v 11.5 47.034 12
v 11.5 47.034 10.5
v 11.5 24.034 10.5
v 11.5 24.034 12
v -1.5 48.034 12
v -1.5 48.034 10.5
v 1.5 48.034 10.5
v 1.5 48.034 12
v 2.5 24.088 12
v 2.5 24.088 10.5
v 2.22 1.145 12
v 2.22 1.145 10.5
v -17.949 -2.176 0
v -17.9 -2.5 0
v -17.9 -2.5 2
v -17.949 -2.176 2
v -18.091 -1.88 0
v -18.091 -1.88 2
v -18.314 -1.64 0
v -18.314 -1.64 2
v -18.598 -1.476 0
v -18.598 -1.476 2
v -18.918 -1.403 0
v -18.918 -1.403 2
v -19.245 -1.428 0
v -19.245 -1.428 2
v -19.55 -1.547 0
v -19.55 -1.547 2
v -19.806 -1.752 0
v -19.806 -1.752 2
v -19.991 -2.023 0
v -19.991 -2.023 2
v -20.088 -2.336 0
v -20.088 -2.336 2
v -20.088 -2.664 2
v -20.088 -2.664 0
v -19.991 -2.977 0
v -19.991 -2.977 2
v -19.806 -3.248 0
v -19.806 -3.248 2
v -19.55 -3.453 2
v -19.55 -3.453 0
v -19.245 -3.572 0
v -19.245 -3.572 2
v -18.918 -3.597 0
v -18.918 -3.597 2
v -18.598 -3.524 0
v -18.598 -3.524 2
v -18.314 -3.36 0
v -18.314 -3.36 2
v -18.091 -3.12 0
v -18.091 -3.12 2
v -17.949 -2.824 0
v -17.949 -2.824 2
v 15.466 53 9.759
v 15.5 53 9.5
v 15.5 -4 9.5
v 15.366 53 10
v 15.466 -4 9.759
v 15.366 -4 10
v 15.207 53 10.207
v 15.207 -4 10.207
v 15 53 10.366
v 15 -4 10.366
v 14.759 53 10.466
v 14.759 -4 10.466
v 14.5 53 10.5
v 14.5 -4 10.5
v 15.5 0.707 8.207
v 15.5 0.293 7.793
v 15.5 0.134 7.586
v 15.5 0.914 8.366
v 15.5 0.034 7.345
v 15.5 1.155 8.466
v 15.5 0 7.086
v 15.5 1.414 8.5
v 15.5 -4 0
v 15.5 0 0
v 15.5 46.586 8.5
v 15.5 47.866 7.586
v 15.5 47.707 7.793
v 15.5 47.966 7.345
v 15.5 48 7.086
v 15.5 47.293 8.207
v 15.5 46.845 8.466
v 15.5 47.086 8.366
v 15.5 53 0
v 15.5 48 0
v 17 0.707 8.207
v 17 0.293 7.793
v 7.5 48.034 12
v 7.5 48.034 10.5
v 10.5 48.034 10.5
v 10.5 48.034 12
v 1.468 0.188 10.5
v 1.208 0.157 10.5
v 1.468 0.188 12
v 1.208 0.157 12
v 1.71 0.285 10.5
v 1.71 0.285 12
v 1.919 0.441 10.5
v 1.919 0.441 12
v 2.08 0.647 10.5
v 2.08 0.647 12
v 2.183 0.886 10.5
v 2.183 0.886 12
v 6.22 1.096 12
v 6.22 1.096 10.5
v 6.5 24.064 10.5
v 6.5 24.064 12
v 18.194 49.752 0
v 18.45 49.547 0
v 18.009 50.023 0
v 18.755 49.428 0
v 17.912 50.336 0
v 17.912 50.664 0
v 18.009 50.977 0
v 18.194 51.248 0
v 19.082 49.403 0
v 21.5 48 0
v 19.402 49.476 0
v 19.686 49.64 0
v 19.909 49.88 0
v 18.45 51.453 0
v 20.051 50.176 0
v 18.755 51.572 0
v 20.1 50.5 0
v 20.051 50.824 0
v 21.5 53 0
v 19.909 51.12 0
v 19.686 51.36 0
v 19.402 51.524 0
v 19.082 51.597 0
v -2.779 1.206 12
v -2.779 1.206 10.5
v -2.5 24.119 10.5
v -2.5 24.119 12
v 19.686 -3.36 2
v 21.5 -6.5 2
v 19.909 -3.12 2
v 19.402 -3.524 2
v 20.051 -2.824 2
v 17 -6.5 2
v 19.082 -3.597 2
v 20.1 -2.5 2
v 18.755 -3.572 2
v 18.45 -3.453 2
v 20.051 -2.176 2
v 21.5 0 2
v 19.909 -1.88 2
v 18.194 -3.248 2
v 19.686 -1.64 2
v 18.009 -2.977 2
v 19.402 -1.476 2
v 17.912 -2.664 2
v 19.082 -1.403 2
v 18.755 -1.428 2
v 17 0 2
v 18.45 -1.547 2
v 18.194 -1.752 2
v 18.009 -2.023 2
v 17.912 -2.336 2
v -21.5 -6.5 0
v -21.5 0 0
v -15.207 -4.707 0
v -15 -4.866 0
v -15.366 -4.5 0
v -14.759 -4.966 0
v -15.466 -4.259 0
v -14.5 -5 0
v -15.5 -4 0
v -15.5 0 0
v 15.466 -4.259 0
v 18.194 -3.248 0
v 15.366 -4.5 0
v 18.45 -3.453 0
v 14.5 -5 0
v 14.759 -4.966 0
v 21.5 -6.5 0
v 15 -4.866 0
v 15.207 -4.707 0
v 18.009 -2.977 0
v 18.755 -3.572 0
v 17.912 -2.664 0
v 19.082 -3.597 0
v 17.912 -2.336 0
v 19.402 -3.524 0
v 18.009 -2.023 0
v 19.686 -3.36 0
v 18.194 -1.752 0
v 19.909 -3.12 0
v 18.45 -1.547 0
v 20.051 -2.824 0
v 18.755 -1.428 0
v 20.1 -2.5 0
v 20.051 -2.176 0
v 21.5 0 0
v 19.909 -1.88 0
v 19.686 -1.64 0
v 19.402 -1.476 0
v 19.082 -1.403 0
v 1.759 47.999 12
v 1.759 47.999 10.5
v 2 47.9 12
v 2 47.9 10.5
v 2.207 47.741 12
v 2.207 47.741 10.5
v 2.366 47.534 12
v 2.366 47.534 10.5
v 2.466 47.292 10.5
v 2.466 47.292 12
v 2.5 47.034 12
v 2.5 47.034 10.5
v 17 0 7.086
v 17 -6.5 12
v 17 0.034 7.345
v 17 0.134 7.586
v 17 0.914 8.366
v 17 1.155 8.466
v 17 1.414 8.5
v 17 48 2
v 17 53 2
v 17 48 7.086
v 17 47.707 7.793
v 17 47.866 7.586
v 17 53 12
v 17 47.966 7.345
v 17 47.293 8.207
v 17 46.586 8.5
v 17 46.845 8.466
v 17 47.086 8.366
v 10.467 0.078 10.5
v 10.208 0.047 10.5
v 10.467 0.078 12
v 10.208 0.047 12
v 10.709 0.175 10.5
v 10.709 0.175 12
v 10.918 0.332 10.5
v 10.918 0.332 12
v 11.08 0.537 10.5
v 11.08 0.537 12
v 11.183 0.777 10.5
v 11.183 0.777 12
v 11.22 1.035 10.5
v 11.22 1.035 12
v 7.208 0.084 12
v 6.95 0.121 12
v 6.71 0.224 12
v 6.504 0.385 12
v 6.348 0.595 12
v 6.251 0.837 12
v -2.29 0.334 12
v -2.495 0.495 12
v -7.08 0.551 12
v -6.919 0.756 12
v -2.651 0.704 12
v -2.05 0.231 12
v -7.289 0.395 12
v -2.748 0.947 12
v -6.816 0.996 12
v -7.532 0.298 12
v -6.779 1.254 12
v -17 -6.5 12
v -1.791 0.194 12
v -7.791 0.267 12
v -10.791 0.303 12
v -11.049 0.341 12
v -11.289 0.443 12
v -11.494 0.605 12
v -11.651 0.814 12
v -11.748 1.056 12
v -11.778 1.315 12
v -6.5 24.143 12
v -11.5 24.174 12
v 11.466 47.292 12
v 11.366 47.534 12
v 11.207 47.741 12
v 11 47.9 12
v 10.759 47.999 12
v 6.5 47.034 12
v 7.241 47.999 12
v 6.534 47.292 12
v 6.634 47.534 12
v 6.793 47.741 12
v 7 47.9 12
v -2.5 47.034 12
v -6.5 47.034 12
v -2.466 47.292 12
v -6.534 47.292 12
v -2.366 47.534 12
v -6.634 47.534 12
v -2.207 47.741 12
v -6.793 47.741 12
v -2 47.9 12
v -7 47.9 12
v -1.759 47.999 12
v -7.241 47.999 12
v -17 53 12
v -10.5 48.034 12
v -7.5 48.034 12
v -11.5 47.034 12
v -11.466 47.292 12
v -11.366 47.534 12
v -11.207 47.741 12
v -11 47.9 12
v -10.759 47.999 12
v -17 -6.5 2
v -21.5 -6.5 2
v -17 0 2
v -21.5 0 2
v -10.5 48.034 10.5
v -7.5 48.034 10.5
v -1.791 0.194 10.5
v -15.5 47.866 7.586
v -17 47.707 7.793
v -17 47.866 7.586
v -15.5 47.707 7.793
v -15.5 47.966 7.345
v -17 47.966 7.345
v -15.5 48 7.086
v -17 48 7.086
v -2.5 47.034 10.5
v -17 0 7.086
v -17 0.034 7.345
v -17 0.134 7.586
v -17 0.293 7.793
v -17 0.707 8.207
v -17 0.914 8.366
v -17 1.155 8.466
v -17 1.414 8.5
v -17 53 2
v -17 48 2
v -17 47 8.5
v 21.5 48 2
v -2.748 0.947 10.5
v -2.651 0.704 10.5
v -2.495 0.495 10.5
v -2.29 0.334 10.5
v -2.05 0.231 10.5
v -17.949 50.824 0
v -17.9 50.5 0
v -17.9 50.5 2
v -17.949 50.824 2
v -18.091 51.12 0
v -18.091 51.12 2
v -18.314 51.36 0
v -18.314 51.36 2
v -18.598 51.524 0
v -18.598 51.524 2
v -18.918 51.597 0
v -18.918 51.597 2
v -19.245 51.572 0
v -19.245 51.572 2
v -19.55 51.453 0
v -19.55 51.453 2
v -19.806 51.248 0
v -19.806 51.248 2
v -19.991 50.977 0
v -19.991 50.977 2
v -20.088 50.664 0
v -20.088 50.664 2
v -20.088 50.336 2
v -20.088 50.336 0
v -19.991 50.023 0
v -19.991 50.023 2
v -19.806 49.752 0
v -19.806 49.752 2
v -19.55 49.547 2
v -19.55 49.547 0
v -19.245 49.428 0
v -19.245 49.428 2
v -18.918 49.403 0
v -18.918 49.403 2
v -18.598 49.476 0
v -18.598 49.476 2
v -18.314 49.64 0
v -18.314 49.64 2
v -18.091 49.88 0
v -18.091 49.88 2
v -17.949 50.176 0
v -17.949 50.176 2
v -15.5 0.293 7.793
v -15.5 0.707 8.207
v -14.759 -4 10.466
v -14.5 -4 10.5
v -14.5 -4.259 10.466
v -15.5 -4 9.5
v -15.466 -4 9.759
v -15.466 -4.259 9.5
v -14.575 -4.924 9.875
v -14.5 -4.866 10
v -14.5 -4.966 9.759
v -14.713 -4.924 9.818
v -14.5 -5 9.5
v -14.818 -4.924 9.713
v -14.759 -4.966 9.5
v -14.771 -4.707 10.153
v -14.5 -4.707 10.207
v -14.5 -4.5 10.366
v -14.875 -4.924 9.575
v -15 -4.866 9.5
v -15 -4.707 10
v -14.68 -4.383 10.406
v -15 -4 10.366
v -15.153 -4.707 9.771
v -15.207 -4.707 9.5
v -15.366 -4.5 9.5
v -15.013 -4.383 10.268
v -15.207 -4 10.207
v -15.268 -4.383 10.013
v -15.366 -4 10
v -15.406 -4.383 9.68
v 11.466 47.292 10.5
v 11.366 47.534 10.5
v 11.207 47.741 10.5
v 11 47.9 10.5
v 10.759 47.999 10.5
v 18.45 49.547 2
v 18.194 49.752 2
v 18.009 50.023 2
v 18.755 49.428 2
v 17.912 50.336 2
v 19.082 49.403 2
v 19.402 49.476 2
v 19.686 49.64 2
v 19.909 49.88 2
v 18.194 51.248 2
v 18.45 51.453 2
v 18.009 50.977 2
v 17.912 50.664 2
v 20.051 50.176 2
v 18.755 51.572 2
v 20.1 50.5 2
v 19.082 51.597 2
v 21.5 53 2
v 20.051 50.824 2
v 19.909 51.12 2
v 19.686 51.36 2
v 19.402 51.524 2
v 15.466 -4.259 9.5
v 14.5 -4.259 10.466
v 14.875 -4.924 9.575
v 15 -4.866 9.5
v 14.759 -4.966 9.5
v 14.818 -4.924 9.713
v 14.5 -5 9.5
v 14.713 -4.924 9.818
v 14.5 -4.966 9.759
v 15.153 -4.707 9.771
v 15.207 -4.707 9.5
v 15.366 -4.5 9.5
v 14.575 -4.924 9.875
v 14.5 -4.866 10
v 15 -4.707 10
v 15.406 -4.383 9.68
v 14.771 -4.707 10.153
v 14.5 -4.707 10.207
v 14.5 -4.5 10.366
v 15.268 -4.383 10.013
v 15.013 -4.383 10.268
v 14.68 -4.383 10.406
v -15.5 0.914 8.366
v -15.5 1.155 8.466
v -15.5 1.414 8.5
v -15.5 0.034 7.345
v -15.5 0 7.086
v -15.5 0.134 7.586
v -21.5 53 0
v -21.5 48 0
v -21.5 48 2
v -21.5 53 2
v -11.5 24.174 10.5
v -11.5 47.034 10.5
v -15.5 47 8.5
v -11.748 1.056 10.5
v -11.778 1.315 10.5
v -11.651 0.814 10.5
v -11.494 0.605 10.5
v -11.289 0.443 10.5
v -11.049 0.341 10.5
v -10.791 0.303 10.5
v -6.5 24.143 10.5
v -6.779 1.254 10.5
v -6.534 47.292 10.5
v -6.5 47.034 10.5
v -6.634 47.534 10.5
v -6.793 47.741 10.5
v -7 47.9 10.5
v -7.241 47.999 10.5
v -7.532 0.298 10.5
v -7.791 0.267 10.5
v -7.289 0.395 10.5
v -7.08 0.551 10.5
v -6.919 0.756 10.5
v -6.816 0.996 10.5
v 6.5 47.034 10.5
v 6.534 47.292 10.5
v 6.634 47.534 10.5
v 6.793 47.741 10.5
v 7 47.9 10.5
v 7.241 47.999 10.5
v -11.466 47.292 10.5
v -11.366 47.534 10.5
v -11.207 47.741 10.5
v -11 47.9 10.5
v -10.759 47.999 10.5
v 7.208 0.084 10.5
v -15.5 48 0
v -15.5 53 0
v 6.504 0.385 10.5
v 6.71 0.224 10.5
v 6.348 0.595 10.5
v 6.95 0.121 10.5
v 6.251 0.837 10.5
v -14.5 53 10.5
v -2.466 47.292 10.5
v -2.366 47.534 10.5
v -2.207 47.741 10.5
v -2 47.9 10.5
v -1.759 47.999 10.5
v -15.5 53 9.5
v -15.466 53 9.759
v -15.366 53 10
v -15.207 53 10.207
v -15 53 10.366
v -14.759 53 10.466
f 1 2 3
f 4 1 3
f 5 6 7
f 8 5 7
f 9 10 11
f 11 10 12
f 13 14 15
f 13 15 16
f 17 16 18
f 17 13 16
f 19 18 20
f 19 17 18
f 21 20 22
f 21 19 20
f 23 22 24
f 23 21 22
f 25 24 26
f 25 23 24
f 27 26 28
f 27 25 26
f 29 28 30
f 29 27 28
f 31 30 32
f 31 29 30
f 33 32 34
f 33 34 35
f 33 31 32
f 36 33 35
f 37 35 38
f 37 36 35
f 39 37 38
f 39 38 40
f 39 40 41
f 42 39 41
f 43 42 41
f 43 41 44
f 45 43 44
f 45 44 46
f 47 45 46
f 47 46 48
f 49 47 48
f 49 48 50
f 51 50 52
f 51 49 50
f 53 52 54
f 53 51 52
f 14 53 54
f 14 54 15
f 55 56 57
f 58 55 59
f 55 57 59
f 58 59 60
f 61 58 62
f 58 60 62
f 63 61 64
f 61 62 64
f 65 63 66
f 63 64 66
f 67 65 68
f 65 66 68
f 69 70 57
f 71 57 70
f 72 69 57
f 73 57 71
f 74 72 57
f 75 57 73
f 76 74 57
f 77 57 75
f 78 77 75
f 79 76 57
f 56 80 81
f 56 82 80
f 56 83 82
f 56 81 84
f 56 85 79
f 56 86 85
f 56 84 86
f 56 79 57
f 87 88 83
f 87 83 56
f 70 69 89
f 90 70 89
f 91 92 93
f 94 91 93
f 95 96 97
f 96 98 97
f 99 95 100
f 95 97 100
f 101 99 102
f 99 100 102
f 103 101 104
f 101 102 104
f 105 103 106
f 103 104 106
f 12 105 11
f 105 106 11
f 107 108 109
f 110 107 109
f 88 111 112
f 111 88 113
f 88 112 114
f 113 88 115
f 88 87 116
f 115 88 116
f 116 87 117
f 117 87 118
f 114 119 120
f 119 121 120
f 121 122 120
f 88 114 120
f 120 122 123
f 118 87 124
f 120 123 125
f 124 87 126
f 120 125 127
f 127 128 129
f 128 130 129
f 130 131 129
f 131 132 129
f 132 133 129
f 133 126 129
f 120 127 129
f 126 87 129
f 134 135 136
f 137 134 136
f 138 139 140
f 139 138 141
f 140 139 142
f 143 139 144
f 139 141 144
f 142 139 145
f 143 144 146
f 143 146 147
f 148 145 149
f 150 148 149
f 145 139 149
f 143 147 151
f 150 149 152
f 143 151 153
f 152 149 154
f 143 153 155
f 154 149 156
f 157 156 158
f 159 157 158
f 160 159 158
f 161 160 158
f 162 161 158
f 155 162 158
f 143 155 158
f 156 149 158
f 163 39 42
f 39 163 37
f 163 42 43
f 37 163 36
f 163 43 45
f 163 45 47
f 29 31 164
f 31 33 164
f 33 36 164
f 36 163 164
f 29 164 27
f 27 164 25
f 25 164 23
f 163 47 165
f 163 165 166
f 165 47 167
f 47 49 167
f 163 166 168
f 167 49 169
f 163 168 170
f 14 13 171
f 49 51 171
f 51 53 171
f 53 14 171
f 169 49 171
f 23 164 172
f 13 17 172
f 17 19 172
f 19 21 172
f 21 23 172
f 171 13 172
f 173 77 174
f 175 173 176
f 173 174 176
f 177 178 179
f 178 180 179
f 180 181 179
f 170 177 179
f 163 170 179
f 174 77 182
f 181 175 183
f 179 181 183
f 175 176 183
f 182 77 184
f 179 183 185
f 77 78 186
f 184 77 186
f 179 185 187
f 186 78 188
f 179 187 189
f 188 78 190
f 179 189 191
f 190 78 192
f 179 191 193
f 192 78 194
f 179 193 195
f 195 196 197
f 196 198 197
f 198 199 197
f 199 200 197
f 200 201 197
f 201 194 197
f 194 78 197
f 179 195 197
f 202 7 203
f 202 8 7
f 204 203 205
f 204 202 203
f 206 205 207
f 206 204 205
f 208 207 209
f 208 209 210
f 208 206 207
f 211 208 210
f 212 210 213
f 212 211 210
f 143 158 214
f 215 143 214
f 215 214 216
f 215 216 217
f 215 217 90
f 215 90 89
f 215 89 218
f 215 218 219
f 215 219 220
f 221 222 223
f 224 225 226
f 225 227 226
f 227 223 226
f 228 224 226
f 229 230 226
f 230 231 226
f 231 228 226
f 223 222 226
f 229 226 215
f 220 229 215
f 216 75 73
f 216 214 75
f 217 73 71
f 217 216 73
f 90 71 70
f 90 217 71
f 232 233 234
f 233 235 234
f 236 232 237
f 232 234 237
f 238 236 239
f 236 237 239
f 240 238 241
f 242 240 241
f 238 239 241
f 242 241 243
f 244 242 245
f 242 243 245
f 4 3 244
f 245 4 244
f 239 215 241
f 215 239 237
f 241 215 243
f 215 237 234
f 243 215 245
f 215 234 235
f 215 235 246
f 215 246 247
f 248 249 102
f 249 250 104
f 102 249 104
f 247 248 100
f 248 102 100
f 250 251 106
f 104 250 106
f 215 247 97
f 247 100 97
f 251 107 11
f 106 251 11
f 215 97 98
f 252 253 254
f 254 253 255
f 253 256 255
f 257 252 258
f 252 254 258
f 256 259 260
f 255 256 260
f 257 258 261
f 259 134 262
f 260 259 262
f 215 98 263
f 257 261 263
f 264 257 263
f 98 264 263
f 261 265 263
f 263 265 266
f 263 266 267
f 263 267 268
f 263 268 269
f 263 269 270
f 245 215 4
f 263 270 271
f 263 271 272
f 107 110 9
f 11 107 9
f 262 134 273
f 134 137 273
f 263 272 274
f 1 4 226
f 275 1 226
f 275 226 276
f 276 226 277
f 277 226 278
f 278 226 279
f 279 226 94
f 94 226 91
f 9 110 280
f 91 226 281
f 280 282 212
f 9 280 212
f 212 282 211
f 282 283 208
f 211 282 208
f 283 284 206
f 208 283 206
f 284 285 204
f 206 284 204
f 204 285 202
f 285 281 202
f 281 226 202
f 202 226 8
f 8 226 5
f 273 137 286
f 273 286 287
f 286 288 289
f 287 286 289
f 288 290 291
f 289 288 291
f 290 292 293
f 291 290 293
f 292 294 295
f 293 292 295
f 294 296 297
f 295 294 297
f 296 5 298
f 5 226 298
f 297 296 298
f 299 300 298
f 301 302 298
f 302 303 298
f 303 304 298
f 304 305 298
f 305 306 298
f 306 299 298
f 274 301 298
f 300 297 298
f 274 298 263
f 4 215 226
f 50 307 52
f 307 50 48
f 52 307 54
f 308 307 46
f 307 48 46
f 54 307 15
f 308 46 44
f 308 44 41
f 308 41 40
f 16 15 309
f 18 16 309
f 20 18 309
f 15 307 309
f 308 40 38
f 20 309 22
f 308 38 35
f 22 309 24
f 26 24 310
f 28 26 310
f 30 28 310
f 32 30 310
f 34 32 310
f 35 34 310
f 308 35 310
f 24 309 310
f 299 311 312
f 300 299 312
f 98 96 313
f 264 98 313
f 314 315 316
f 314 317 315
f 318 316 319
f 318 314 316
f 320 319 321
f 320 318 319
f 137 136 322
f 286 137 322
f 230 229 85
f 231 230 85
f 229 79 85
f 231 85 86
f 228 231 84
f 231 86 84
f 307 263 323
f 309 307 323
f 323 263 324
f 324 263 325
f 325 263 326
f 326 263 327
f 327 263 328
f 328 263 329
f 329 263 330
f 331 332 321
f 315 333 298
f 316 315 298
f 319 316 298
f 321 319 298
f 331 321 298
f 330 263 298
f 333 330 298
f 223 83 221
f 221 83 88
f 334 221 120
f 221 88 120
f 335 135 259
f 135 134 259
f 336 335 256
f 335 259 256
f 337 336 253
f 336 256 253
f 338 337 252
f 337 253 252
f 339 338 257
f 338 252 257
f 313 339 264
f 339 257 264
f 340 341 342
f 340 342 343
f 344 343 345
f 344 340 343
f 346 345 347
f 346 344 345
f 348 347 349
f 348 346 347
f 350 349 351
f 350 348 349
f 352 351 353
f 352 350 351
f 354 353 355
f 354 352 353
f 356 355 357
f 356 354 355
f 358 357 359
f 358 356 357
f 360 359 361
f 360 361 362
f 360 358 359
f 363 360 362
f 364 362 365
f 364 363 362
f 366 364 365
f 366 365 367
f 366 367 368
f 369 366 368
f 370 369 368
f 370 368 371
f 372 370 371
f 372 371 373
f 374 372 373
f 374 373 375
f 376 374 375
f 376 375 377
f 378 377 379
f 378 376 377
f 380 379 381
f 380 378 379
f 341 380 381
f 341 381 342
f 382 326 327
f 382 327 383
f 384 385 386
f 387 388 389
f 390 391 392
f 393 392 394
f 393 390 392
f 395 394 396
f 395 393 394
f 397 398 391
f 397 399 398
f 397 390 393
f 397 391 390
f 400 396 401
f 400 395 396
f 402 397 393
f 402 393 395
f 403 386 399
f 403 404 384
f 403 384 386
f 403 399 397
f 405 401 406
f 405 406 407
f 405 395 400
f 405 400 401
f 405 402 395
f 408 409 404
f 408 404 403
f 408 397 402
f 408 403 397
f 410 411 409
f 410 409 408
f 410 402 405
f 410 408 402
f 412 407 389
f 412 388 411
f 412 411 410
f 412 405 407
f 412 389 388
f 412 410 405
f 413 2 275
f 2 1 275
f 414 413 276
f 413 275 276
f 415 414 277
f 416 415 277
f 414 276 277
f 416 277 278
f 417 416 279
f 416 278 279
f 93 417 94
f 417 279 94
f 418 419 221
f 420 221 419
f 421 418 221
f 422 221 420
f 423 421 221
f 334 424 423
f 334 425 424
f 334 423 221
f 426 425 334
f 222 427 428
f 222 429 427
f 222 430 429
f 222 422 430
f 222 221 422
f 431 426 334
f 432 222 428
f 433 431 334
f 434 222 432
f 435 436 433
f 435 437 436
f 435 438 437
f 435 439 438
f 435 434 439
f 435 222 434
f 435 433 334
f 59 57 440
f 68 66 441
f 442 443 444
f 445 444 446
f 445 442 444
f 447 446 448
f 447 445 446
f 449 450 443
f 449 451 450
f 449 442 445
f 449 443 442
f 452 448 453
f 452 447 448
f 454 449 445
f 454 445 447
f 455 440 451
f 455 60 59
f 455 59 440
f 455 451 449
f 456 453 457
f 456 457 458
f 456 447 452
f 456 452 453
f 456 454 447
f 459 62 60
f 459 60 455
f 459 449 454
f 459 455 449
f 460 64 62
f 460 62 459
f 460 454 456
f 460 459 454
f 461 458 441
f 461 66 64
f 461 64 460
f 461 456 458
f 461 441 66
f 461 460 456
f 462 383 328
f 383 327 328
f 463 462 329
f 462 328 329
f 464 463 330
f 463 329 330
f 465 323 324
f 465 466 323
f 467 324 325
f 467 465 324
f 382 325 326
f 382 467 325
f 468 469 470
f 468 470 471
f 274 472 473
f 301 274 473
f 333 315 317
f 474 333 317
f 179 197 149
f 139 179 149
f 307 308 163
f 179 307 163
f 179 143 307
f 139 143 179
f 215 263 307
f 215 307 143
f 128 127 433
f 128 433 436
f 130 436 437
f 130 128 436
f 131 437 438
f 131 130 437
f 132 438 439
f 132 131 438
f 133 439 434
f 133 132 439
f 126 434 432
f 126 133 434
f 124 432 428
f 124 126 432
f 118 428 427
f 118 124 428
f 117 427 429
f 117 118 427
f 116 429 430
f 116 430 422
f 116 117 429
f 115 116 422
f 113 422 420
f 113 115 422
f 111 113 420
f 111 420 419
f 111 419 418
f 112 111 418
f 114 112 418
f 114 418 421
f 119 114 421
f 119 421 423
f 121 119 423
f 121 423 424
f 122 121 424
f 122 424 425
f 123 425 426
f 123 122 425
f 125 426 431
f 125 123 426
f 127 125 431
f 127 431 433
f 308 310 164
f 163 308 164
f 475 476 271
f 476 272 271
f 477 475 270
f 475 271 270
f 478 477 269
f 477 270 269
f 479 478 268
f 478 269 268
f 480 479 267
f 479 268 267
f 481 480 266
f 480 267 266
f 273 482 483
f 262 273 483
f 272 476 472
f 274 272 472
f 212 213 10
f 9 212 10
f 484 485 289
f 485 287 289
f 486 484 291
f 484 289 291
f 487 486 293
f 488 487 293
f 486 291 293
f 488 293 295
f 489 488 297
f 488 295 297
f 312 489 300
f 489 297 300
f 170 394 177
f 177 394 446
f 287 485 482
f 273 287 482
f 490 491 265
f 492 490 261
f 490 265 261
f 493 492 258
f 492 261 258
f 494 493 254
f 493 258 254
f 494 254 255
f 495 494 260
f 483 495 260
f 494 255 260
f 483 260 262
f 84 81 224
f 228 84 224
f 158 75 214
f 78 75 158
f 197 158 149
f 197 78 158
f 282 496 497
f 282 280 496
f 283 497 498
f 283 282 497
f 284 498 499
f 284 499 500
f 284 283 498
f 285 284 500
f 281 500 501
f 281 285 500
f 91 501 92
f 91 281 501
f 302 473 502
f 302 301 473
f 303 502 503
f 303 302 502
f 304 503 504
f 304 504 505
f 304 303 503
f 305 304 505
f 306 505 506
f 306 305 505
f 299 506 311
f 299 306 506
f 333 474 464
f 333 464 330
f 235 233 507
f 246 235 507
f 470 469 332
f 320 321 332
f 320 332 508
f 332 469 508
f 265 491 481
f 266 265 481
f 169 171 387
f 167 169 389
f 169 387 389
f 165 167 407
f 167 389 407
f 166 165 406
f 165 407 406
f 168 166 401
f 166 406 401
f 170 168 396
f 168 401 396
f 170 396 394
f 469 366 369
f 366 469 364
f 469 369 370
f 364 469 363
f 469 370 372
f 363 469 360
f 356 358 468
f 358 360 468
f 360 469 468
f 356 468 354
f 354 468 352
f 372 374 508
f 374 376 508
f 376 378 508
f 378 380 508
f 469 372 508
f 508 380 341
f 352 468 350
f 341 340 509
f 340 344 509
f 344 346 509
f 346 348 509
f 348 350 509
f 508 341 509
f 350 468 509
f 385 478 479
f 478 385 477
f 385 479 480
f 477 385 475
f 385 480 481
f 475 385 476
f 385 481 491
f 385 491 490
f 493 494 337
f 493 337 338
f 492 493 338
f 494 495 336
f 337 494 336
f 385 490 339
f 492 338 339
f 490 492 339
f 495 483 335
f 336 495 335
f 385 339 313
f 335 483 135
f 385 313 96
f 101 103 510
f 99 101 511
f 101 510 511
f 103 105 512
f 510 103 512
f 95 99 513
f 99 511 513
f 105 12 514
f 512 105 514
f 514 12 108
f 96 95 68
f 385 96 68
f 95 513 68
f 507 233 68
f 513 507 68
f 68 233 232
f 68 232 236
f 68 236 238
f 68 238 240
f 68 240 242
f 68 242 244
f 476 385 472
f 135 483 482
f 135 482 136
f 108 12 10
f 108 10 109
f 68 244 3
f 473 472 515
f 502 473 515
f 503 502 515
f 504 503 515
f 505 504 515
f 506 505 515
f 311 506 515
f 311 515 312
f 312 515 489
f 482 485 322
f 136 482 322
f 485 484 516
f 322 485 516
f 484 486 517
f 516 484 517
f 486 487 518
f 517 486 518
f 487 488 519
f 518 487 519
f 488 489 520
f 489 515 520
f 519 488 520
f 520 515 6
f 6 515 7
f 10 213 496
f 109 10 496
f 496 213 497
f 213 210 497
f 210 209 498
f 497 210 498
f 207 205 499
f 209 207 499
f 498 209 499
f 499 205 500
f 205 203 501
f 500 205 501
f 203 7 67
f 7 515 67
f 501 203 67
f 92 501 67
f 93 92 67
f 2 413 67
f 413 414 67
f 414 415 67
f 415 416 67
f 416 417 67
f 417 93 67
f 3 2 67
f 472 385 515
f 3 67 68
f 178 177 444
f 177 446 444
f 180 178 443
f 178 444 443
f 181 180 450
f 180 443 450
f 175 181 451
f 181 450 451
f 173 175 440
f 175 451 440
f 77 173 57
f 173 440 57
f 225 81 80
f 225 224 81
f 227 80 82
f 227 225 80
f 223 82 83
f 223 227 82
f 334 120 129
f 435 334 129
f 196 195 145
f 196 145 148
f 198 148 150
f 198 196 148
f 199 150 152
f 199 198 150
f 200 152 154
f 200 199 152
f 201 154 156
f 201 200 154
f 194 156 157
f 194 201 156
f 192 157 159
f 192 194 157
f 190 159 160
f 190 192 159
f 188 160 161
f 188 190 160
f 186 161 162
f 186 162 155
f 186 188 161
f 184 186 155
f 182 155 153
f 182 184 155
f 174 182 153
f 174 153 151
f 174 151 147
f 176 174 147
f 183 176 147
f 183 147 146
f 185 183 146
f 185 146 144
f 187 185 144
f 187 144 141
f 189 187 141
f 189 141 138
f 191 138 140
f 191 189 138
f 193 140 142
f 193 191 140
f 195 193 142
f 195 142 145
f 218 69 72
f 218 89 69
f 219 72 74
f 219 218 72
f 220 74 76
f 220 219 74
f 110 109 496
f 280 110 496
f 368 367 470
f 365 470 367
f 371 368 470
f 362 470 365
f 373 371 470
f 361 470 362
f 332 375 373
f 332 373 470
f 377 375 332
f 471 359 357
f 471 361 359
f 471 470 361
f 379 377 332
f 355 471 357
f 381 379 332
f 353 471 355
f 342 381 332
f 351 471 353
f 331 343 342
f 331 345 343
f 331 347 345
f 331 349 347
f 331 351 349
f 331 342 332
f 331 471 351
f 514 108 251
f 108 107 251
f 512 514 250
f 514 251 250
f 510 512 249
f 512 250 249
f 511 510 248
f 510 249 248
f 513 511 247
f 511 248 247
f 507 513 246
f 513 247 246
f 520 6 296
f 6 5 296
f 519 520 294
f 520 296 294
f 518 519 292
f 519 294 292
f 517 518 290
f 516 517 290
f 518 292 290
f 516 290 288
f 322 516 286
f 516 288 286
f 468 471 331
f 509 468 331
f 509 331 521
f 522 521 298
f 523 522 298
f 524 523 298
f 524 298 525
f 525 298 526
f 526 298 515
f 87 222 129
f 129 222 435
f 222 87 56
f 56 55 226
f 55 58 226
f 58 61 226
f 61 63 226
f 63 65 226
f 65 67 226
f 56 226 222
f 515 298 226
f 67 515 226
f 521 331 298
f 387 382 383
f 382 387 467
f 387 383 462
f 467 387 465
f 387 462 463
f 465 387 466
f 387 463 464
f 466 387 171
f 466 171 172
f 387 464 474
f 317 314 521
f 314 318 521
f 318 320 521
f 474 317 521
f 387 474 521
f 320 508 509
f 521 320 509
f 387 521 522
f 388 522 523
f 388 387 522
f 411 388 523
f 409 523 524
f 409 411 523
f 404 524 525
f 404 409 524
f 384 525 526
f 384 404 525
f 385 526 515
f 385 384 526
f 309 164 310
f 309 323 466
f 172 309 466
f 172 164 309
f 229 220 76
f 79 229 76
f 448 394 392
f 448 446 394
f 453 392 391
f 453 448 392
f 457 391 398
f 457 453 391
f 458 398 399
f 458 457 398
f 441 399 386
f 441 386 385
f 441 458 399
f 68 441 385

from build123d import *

# Parameters (mm, degrees)
SKETCH1_W             = 6
SKETCH1_H             = 5
SKETCH1_R             = 1.1
BOSS_EXTRUDE1_DEPTH   = 2
BOSS_EXTRUDE1_2_DEPTH = 2
BOSS_EXTRUDE1_3_DEPTH = 2
BOSS_EXTRUDE1_4_DEPTH = 2
SKETCH2_W             = 1.5
SKETCH2_H             = 5
BOSS_EXTRUDE2_DEPTH   = 10
SKETCH3_W             = 34
SKETCH3_H             = 58
BOSS_EXTRUDE3_DEPTH   = 1.5
BOSS_EXTRUDE4_DEPTH   = 1.5
CHAMFER1_SIZE         = 3
SKETCH5_W             = 1.5
SKETCH5_H             = 50
BOSS_EXTRUDE5_DEPTH   = 2
FILLET1_R             = 1
CUT_EXTRUDE1_DEPTH    = 2
FILLET2_R             = 1


with BuildPart() as part:
    # Sketch1 → Boss-Extrude1 (new body)
    with BuildSketch(Plane.XY):
        with Locations((18.5, 50.5)):
            Rectangle(SKETCH1_W, SKETCH1_H)
        with Locations((19, 50.5)):
            Circle(SKETCH1_R, mode=Mode.SUBTRACT)
    extrude(amount=BOSS_EXTRUDE1_DEPTH)



with BuildPart() as body_2:
    # Sketch1 → Boss-Extrude1 2 (new body)
    with BuildSketch(Plane.XY):
        with Locations((-18.5, 50.5)):
            Rectangle(SKETCH1_W, SKETCH1_H)
        with Locations((-19, 50.5)):
            Circle(SKETCH1_R, mode=Mode.SUBTRACT)
    extrude(amount=BOSS_EXTRUDE1_2_DEPTH)


with BuildPart() as body_3:
    # Sketch1 → Boss-Extrude1 3 (new body)
    with BuildSketch(Plane.XY):
        with Locations((18.5, -2.5)):
            Rectangle(SKETCH1_W, SKETCH1_H)
        with Locations((19, -2.5)):
            Circle(SKETCH1_R, mode=Mode.SUBTRACT)
    extrude(amount=BOSS_EXTRUDE1_3_DEPTH)


with BuildPart() as body_4:
    # Sketch1 → Boss-Extrude1 4 (new body)
    with BuildSketch(Plane.XY):
        with Locations((-18.5, -2.5)):
            Rectangle(SKETCH1_W, SKETCH1_H)
        with Locations((-19, -2.5)):
            Circle(SKETCH1_R, mode=Mode.SUBTRACT)
    extrude(amount=BOSS_EXTRUDE1_4_DEPTH)


with BuildPart() as part_1:
    add(part.part)

    add(body_2.part)  # Boss-Extrude2 merges body 2

    add(body_3.part)  # Boss-Extrude2 merges body 3

    add(body_4.part)  # Boss-Extrude2 merges body 4
    # Sketch2 → Boss-Extrude2 (add)
    with BuildSketch(Plane.XY.offset(2)):
        with Locations((16.25, 50.5)):
            Rectangle(SKETCH2_W, SKETCH2_H)
        with Locations((16.25, -2.5)):
            Rectangle(SKETCH2_W, SKETCH2_H)
        with Locations((-16.25, -2.5)):
            Rectangle(SKETCH2_W, SKETCH2_H)
        with Locations((-16.25, 50.5)):
            Rectangle(SKETCH2_W, SKETCH2_H)
    extrude(amount=BOSS_EXTRUDE2_DEPTH)

    # Sketch3 → Boss-Extrude3 (add)
    with BuildSketch(Plane.XY.offset(12)):
        with Locations((0, 24)):
            Rectangle(SKETCH3_W, SKETCH3_H)
    extrude(amount=-BOSS_EXTRUDE3_DEPTH)

    # Sketch4 → Boss-Extrude4 (add)
    with BuildSketch(Plane.XZ.offset(5)):
        Polygon((-15.5, 0), (15.5, 0), (21.5, 0), (21.5, 2), (17, 2), (17, 12), (-17, 12), (-17, 2), (-21.5, 2), (-21.5, 0), align=None)
    extrude(amount=BOSS_EXTRUDE4_DEPTH)

    # Chamfer1
    chamfer1_edges = [part_1.edges().sort_by_distance(p)[0] for p in [
        (16.25, 48, 10.5),
        (-16.25, 48, 10.5),
        (16.25, 0, 10.5),
        (-16.25, 0, 10.5),
    ]]
    chamfer(chamfer1_edges, length=CHAMFER1_SIZE)

    # Sketch5 → Boss-Extrude5 (add)
    with BuildSketch(Plane(origin=(0, 0, 10.5), x_dir=(-1, 0, 0), z_dir=(0, 0, -1))):
        with Locations((16.25, 24)):
            Rectangle(SKETCH5_W, SKETCH5_H)
        with Locations((-16.25, 24)):
            Rectangle(SKETCH5_W, SKETCH5_H)
    extrude(amount=BOSS_EXTRUDE5_DEPTH)

    # Fillet1
    fillet1_edges = [part_1.edges().sort_by_distance(p)[0] for p in [
        (-16.25, 0, 7.5),
        (-16.25, 48, 7.5),
        (16.25, 0, 7.5),
        (16.25, 48, 7.5),
        (16.25, 47, 8.5),
        (16.25, 1, 8.5),
        (-16.25, 1, 8.5),
        (15.5, 24, 10.5),
        (-15.5, 24, 10.5),
        (15.5, -5, 5.25),
        (0, -5, 10.5),
        (-15.5, -5, 5.25),
    ]]
    fillet(fillet1_edges, radius=FILLET1_R)

    # Sketch6 → Cut-Extrude1 (cut)
    with BuildSketch(Plane(origin=(0, 0, 10.5), x_dir=(-1, 0, 0), z_dir=(0, 0, -1))):
        Polygon((-6.5, 48.033502568), (-11.5, 48.033502568), (-11.5, 24.033502568), (-11.207624805, 0.035283535), (-6.207995839, 0.096195034), (-6.5, 24.063959447), align=None)
        Polygon((-2.5, 48.033502568), (-2.5, 24.088324951), (-2.208292667, 0.144924233), (2.791336298, 0.205835732), (2.5, 24.11878183), (2.5, 48.033502568), align=None)
        Polygon((11.5, 48.033502568), (6.5, 48.033502568), (6.5, 24.143147334), (6.79103947, 0.254564931), (11.790668435, 0.31547643), (11.5, 24.173604214), align=None)
    extrude(amount=-CUT_EXTRUDE1_DEPTH, mode=Mode.SUBTRACT)

    # Fillet2
    fillet2_edges = [part_1.edges().sort_by_distance(p)[0] for p in [
        (11.207624805, 0.035283535, 11.25),
        (11.5, 48.033502568, 11.25),
        (6.5, 48.033502568, 11.25),
        (6.207995839, 0.096195034, 11.25),
        (-2.791336298, 0.205835732, 11.25),
        (2.208292667, 0.144924233, 11.25),
        (2.5, 48.033502568, 11.25),
        (-2.5, 48.033502568, 11.25),
        (-6.79103947, 0.254564931, 11.25),
        (-6.5, 48.033502568, 11.25),
        (-11.5, 48.033502568, 11.25),
        (-11.790668435, 0.31547643, 11.25),
    ]]
    fillet(fillet2_edges, radius=FILLET2_R)


solid = part_1.part
